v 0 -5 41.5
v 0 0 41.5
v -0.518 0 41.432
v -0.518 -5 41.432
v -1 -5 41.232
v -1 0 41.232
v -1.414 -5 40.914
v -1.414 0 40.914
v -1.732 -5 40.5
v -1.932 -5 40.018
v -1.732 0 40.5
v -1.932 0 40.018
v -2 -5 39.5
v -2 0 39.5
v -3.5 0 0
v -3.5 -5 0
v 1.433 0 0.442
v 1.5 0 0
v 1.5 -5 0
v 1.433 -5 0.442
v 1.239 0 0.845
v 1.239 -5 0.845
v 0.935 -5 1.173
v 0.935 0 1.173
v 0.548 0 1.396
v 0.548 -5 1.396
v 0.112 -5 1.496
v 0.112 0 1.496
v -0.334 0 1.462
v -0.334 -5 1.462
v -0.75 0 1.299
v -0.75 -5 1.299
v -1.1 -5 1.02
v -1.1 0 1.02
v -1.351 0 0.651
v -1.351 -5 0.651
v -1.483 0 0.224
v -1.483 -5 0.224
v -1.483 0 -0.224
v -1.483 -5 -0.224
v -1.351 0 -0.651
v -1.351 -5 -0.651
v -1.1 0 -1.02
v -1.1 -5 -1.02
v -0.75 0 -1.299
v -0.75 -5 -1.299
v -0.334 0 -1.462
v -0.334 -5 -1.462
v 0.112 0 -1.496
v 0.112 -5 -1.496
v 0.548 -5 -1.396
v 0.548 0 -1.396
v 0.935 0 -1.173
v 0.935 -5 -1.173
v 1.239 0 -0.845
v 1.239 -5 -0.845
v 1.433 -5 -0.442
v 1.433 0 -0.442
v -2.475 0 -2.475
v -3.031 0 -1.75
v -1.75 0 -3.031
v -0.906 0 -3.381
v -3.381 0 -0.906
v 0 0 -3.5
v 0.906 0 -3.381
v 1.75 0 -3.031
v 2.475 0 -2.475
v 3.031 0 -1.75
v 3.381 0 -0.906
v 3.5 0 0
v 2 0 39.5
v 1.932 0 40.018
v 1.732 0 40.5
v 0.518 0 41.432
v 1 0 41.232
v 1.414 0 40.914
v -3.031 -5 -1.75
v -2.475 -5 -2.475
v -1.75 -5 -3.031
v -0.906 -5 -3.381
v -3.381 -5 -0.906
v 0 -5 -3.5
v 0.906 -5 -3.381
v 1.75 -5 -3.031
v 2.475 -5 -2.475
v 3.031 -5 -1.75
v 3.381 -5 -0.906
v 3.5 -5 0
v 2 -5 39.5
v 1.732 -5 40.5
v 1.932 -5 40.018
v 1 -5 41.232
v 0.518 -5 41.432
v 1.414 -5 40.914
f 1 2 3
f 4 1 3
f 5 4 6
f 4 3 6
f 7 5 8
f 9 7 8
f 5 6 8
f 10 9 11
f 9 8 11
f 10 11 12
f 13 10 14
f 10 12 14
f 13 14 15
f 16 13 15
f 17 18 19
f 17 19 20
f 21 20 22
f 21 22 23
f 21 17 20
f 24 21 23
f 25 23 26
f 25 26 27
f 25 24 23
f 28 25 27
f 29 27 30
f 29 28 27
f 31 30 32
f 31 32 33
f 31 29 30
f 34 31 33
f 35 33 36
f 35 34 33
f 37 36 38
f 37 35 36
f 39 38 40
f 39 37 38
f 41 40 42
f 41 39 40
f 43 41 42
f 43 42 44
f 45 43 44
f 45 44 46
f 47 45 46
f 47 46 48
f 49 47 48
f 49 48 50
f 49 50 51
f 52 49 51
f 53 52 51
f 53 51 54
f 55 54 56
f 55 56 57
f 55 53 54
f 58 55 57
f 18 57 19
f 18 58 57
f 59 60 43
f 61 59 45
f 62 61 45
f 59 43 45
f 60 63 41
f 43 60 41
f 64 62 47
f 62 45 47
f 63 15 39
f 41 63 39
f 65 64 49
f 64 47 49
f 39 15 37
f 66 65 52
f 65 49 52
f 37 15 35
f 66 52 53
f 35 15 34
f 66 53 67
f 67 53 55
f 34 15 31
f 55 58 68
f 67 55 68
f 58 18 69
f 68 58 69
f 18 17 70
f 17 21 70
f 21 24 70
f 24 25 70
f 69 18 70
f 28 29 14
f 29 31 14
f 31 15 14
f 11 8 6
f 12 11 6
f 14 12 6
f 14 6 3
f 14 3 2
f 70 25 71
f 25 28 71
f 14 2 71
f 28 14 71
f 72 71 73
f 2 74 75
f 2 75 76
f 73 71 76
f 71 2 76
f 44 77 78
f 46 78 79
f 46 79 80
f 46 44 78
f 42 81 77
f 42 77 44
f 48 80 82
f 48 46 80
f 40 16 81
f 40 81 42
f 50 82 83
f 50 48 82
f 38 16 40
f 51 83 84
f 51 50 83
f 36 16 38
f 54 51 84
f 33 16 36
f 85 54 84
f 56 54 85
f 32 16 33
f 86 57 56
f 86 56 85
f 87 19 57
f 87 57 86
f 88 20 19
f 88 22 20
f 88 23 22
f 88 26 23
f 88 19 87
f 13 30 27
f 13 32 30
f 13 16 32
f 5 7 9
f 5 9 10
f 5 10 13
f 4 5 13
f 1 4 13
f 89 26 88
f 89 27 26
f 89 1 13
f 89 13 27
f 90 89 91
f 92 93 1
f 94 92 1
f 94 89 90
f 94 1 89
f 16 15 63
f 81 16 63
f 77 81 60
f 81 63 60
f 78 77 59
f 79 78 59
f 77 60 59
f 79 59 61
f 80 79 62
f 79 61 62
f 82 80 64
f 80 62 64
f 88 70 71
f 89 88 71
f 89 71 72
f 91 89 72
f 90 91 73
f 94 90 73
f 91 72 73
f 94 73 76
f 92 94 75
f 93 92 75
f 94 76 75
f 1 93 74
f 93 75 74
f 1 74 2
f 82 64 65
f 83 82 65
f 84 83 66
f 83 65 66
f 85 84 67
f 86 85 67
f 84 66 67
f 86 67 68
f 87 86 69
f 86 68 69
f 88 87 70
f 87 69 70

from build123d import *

# Parameters (mm, degrees)
F0_R     = 1.5
F1_DEPTH = 5


with BuildPart() as f1:
    # F0 (on Front) → F1 (new body)
    with BuildSketch(Plane.XZ):
        with BuildLine():
            Line((-2, 39.5), (-3.5, 0))
            ThreePointArc((-3.5, 0), (-2.474874, -2.474874), (0, -3.5))
            ThreePointArc((0, -3.5), (2.474874, -2.474874), (3.5, 0))
            Line((3.5, 0), (2, 39.5))
            ThreePointArc((2, 39.5), (1.414214, 40.914214), (0, 41.5))
            ThreePointArc((0, 41.5), (-1.414214, 40.914214), (-2, 39.5))
        make_face()
        Circle(F0_R, mode=Mode.SUBTRACT)
    extrude(amount=F1_DEPTH)


solid = f1.part
